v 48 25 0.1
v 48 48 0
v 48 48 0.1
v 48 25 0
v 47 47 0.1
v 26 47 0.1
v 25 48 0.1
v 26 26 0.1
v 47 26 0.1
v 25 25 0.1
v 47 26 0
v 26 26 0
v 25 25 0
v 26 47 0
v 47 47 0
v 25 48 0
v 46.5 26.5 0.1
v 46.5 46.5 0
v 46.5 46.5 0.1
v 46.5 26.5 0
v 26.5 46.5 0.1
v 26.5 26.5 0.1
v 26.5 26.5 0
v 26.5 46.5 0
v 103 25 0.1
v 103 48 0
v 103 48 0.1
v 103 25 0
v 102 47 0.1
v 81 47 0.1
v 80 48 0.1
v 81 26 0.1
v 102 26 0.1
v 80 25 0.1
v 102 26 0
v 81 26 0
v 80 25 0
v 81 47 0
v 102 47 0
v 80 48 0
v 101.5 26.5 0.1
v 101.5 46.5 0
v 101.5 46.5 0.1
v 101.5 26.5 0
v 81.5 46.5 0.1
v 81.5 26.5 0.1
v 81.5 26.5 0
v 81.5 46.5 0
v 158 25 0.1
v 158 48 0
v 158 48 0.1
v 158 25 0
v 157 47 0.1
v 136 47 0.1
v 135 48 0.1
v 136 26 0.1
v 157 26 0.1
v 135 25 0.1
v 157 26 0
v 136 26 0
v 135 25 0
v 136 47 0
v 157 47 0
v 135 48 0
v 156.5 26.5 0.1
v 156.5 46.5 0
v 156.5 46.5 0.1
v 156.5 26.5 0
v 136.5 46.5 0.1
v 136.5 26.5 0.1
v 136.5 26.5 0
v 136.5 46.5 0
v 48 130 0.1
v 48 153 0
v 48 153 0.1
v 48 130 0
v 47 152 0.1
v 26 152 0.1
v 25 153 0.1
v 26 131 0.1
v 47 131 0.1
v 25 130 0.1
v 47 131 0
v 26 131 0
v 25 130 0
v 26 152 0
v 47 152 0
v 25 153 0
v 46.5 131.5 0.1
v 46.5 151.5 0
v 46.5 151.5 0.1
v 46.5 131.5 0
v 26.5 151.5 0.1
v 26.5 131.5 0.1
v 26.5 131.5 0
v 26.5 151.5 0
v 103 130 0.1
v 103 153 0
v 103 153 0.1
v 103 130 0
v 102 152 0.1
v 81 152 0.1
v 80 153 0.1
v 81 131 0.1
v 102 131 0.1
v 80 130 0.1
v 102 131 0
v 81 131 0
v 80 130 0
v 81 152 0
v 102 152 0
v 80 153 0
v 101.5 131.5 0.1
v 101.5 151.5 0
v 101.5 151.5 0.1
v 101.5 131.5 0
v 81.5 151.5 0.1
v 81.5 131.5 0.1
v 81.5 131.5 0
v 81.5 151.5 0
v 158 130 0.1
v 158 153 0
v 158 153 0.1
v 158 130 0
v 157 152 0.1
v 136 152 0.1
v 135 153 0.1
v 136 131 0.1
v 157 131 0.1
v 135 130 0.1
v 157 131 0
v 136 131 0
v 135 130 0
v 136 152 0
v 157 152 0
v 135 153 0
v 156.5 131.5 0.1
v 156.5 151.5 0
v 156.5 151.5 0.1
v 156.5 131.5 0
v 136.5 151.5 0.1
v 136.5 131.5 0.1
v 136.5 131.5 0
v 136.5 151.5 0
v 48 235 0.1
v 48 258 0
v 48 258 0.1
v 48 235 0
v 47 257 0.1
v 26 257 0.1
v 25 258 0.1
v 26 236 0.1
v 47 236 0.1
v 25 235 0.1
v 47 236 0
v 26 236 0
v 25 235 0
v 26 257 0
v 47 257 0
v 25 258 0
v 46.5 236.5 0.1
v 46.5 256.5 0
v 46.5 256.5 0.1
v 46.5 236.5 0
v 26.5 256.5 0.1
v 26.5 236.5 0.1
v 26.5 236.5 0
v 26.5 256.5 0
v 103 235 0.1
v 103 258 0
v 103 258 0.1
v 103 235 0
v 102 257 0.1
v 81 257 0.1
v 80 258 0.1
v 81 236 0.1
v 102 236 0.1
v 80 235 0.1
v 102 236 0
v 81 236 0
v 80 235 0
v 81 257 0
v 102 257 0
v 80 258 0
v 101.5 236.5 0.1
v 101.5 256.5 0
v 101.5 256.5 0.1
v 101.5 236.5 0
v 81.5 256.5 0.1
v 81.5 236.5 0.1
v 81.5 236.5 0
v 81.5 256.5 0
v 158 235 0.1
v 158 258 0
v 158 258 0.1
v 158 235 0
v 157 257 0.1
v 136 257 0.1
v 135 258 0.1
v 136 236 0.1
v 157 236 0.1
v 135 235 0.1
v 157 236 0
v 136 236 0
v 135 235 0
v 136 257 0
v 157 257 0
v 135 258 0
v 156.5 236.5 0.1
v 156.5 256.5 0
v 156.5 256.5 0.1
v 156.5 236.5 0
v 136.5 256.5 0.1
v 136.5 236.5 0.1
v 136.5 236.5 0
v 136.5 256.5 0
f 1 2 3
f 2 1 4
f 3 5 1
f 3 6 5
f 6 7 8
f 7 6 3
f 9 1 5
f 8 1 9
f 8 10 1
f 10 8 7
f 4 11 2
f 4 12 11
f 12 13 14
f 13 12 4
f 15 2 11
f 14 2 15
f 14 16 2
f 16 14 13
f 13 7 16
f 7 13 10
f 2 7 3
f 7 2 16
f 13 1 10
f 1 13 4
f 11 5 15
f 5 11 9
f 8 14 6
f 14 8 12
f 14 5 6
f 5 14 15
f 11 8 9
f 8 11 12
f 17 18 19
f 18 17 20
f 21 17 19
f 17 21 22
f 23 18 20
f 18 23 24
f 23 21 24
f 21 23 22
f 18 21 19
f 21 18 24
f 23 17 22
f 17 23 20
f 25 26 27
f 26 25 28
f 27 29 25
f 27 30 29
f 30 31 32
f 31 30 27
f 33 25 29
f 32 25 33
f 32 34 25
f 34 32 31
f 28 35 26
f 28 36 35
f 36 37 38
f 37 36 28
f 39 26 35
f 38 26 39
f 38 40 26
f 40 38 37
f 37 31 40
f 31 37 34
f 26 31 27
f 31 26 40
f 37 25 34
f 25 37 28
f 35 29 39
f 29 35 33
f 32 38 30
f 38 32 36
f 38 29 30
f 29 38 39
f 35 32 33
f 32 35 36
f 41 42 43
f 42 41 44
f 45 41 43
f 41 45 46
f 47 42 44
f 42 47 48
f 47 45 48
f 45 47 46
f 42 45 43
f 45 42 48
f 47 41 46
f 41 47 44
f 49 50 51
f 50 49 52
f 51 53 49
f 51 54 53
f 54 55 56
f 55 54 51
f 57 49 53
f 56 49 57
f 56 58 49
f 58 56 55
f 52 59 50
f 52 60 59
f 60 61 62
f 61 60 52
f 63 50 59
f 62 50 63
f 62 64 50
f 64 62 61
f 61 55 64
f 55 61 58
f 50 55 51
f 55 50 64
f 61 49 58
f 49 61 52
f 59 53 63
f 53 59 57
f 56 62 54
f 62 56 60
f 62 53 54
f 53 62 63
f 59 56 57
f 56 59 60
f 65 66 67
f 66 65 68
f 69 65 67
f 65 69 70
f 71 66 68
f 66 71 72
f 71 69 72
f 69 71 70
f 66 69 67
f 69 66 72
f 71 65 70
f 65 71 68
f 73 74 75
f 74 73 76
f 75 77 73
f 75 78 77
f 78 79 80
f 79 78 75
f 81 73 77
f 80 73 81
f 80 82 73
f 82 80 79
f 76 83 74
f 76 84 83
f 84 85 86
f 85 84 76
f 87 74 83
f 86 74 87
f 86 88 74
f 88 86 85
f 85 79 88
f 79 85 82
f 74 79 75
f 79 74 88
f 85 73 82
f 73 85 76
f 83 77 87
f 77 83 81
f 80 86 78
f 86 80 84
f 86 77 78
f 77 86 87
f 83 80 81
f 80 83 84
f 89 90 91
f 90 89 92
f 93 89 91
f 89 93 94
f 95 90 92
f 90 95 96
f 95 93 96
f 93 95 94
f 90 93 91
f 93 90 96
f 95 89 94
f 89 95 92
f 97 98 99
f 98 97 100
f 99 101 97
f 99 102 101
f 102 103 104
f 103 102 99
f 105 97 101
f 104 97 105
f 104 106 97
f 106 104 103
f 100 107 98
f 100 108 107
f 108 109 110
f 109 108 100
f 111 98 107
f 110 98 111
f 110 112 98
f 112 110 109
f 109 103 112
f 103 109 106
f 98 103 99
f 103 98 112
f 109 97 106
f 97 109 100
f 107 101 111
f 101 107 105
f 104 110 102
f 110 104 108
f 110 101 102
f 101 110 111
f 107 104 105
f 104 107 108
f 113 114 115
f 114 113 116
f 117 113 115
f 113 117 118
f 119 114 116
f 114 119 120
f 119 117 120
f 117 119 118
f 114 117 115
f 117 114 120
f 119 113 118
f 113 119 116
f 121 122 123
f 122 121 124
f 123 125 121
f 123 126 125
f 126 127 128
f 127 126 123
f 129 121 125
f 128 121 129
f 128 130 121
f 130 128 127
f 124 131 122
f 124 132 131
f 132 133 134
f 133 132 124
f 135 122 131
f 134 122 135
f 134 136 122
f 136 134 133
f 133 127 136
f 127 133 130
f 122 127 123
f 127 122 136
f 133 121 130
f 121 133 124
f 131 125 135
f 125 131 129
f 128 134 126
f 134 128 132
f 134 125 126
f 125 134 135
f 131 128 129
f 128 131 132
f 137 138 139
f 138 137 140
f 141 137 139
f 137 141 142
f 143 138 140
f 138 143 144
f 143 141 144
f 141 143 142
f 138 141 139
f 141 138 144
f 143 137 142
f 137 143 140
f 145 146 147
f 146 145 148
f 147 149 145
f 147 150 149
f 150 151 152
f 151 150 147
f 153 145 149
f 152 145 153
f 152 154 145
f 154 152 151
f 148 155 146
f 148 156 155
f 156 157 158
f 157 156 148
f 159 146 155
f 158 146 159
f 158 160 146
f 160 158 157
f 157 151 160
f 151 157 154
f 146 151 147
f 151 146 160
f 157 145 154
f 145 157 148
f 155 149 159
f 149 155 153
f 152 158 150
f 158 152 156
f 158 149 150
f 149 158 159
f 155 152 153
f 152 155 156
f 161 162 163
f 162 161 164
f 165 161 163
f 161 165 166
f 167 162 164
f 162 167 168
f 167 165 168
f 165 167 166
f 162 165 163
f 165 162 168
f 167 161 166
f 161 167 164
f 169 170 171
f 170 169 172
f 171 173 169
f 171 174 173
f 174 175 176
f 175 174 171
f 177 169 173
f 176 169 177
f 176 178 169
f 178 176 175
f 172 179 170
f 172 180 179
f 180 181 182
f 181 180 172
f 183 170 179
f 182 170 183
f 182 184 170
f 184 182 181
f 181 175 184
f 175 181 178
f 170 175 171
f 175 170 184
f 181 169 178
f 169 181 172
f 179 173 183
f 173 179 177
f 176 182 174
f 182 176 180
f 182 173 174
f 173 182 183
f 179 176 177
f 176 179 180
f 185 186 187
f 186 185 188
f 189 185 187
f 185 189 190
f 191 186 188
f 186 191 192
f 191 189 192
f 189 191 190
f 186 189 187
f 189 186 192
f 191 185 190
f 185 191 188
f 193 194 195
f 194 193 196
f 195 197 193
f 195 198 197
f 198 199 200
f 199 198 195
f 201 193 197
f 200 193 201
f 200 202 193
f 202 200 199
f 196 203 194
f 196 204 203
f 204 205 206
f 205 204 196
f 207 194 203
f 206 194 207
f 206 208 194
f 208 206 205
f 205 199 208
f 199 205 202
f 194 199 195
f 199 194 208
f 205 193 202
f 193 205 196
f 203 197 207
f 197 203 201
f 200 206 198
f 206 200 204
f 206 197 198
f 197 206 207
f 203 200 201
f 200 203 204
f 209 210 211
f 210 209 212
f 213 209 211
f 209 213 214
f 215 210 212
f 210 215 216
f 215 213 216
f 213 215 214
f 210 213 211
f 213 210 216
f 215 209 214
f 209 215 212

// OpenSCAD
/**
 * Print designed to check that you bed is level
 *
 * print four small squares in each corner to ensure even print quality and good adhesion.
 */

// Define your printers printable area
// If you are using Sprinter firmware then these come directly from configuration.h

X_MAX_LENGTH = 180;
Y_MAX_LENGTH = 280;

THICKNESS = 0.1; //Square / outline thickness
SIZE = 20; //Square width / height
GAP = 0.5; //Width of border between square and parameter
OUTLINE_WIDTH = 1; //Width of parameter around square
OFFSET = 25; //Offset from limits in each axis

translate([OFFSET, OFFSET, 0]) square(); //Top Left
translate([(X_MAX_LENGTH / 2) - (SIZE / 2), OFFSET, 0]) square(); //Top Middle
translate([X_MAX_LENGTH - OFFSET - SIZE, OFFSET, 0]) square(); //Top Right

translate([OFFSET, (Y_MAX_LENGTH / 2) - (SIZE / 2), 0]) square(); //Middle Left
translate([(X_MAX_LENGTH / 2) - (SIZE / 2), (Y_MAX_LENGTH / 2) - (SIZE / 2), 0]) square(); //Middle Middle
translate([X_MAX_LENGTH - OFFSET - SIZE, (Y_MAX_LENGTH / 2) - (SIZE / 2), 0]) square(); //Middle Right

translate([OFFSET, Y_MAX_LENGTH - OFFSET - SIZE, 0]) square(); //Bottom Left
translate([(X_MAX_LENGTH / 2) - (SIZE / 2), Y_MAX_LENGTH - OFFSET - SIZE, 0]) square(); //Bottom Middle
translate([X_MAX_LENGTH - OFFSET - SIZE, Y_MAX_LENGTH - OFFSET - SIZE, 0]) square(); //Bottom Right

module square() {
	//Center square
	translate([
				OUTLINE_WIDTH + GAP,
				OUTLINE_WIDTH + GAP,
				0
			])
		cube([SIZE, SIZE, THICKNESS]);

	//Parameter
	difference() {
		//Outer square
		cube([
				SIZE + (2 * (GAP + OUTLINE_WIDTH)),
				SIZE + (2 * (GAP + OUTLINE_WIDTH)),
				THICKNESS
			]);

		//Inner square
		translate([OUTLINE_WIDTH, OUTLINE_WIDTH, -5])
			cube([SIZE + (2 * GAP), SIZE + (2 * GAP), 10]);
	}
}
